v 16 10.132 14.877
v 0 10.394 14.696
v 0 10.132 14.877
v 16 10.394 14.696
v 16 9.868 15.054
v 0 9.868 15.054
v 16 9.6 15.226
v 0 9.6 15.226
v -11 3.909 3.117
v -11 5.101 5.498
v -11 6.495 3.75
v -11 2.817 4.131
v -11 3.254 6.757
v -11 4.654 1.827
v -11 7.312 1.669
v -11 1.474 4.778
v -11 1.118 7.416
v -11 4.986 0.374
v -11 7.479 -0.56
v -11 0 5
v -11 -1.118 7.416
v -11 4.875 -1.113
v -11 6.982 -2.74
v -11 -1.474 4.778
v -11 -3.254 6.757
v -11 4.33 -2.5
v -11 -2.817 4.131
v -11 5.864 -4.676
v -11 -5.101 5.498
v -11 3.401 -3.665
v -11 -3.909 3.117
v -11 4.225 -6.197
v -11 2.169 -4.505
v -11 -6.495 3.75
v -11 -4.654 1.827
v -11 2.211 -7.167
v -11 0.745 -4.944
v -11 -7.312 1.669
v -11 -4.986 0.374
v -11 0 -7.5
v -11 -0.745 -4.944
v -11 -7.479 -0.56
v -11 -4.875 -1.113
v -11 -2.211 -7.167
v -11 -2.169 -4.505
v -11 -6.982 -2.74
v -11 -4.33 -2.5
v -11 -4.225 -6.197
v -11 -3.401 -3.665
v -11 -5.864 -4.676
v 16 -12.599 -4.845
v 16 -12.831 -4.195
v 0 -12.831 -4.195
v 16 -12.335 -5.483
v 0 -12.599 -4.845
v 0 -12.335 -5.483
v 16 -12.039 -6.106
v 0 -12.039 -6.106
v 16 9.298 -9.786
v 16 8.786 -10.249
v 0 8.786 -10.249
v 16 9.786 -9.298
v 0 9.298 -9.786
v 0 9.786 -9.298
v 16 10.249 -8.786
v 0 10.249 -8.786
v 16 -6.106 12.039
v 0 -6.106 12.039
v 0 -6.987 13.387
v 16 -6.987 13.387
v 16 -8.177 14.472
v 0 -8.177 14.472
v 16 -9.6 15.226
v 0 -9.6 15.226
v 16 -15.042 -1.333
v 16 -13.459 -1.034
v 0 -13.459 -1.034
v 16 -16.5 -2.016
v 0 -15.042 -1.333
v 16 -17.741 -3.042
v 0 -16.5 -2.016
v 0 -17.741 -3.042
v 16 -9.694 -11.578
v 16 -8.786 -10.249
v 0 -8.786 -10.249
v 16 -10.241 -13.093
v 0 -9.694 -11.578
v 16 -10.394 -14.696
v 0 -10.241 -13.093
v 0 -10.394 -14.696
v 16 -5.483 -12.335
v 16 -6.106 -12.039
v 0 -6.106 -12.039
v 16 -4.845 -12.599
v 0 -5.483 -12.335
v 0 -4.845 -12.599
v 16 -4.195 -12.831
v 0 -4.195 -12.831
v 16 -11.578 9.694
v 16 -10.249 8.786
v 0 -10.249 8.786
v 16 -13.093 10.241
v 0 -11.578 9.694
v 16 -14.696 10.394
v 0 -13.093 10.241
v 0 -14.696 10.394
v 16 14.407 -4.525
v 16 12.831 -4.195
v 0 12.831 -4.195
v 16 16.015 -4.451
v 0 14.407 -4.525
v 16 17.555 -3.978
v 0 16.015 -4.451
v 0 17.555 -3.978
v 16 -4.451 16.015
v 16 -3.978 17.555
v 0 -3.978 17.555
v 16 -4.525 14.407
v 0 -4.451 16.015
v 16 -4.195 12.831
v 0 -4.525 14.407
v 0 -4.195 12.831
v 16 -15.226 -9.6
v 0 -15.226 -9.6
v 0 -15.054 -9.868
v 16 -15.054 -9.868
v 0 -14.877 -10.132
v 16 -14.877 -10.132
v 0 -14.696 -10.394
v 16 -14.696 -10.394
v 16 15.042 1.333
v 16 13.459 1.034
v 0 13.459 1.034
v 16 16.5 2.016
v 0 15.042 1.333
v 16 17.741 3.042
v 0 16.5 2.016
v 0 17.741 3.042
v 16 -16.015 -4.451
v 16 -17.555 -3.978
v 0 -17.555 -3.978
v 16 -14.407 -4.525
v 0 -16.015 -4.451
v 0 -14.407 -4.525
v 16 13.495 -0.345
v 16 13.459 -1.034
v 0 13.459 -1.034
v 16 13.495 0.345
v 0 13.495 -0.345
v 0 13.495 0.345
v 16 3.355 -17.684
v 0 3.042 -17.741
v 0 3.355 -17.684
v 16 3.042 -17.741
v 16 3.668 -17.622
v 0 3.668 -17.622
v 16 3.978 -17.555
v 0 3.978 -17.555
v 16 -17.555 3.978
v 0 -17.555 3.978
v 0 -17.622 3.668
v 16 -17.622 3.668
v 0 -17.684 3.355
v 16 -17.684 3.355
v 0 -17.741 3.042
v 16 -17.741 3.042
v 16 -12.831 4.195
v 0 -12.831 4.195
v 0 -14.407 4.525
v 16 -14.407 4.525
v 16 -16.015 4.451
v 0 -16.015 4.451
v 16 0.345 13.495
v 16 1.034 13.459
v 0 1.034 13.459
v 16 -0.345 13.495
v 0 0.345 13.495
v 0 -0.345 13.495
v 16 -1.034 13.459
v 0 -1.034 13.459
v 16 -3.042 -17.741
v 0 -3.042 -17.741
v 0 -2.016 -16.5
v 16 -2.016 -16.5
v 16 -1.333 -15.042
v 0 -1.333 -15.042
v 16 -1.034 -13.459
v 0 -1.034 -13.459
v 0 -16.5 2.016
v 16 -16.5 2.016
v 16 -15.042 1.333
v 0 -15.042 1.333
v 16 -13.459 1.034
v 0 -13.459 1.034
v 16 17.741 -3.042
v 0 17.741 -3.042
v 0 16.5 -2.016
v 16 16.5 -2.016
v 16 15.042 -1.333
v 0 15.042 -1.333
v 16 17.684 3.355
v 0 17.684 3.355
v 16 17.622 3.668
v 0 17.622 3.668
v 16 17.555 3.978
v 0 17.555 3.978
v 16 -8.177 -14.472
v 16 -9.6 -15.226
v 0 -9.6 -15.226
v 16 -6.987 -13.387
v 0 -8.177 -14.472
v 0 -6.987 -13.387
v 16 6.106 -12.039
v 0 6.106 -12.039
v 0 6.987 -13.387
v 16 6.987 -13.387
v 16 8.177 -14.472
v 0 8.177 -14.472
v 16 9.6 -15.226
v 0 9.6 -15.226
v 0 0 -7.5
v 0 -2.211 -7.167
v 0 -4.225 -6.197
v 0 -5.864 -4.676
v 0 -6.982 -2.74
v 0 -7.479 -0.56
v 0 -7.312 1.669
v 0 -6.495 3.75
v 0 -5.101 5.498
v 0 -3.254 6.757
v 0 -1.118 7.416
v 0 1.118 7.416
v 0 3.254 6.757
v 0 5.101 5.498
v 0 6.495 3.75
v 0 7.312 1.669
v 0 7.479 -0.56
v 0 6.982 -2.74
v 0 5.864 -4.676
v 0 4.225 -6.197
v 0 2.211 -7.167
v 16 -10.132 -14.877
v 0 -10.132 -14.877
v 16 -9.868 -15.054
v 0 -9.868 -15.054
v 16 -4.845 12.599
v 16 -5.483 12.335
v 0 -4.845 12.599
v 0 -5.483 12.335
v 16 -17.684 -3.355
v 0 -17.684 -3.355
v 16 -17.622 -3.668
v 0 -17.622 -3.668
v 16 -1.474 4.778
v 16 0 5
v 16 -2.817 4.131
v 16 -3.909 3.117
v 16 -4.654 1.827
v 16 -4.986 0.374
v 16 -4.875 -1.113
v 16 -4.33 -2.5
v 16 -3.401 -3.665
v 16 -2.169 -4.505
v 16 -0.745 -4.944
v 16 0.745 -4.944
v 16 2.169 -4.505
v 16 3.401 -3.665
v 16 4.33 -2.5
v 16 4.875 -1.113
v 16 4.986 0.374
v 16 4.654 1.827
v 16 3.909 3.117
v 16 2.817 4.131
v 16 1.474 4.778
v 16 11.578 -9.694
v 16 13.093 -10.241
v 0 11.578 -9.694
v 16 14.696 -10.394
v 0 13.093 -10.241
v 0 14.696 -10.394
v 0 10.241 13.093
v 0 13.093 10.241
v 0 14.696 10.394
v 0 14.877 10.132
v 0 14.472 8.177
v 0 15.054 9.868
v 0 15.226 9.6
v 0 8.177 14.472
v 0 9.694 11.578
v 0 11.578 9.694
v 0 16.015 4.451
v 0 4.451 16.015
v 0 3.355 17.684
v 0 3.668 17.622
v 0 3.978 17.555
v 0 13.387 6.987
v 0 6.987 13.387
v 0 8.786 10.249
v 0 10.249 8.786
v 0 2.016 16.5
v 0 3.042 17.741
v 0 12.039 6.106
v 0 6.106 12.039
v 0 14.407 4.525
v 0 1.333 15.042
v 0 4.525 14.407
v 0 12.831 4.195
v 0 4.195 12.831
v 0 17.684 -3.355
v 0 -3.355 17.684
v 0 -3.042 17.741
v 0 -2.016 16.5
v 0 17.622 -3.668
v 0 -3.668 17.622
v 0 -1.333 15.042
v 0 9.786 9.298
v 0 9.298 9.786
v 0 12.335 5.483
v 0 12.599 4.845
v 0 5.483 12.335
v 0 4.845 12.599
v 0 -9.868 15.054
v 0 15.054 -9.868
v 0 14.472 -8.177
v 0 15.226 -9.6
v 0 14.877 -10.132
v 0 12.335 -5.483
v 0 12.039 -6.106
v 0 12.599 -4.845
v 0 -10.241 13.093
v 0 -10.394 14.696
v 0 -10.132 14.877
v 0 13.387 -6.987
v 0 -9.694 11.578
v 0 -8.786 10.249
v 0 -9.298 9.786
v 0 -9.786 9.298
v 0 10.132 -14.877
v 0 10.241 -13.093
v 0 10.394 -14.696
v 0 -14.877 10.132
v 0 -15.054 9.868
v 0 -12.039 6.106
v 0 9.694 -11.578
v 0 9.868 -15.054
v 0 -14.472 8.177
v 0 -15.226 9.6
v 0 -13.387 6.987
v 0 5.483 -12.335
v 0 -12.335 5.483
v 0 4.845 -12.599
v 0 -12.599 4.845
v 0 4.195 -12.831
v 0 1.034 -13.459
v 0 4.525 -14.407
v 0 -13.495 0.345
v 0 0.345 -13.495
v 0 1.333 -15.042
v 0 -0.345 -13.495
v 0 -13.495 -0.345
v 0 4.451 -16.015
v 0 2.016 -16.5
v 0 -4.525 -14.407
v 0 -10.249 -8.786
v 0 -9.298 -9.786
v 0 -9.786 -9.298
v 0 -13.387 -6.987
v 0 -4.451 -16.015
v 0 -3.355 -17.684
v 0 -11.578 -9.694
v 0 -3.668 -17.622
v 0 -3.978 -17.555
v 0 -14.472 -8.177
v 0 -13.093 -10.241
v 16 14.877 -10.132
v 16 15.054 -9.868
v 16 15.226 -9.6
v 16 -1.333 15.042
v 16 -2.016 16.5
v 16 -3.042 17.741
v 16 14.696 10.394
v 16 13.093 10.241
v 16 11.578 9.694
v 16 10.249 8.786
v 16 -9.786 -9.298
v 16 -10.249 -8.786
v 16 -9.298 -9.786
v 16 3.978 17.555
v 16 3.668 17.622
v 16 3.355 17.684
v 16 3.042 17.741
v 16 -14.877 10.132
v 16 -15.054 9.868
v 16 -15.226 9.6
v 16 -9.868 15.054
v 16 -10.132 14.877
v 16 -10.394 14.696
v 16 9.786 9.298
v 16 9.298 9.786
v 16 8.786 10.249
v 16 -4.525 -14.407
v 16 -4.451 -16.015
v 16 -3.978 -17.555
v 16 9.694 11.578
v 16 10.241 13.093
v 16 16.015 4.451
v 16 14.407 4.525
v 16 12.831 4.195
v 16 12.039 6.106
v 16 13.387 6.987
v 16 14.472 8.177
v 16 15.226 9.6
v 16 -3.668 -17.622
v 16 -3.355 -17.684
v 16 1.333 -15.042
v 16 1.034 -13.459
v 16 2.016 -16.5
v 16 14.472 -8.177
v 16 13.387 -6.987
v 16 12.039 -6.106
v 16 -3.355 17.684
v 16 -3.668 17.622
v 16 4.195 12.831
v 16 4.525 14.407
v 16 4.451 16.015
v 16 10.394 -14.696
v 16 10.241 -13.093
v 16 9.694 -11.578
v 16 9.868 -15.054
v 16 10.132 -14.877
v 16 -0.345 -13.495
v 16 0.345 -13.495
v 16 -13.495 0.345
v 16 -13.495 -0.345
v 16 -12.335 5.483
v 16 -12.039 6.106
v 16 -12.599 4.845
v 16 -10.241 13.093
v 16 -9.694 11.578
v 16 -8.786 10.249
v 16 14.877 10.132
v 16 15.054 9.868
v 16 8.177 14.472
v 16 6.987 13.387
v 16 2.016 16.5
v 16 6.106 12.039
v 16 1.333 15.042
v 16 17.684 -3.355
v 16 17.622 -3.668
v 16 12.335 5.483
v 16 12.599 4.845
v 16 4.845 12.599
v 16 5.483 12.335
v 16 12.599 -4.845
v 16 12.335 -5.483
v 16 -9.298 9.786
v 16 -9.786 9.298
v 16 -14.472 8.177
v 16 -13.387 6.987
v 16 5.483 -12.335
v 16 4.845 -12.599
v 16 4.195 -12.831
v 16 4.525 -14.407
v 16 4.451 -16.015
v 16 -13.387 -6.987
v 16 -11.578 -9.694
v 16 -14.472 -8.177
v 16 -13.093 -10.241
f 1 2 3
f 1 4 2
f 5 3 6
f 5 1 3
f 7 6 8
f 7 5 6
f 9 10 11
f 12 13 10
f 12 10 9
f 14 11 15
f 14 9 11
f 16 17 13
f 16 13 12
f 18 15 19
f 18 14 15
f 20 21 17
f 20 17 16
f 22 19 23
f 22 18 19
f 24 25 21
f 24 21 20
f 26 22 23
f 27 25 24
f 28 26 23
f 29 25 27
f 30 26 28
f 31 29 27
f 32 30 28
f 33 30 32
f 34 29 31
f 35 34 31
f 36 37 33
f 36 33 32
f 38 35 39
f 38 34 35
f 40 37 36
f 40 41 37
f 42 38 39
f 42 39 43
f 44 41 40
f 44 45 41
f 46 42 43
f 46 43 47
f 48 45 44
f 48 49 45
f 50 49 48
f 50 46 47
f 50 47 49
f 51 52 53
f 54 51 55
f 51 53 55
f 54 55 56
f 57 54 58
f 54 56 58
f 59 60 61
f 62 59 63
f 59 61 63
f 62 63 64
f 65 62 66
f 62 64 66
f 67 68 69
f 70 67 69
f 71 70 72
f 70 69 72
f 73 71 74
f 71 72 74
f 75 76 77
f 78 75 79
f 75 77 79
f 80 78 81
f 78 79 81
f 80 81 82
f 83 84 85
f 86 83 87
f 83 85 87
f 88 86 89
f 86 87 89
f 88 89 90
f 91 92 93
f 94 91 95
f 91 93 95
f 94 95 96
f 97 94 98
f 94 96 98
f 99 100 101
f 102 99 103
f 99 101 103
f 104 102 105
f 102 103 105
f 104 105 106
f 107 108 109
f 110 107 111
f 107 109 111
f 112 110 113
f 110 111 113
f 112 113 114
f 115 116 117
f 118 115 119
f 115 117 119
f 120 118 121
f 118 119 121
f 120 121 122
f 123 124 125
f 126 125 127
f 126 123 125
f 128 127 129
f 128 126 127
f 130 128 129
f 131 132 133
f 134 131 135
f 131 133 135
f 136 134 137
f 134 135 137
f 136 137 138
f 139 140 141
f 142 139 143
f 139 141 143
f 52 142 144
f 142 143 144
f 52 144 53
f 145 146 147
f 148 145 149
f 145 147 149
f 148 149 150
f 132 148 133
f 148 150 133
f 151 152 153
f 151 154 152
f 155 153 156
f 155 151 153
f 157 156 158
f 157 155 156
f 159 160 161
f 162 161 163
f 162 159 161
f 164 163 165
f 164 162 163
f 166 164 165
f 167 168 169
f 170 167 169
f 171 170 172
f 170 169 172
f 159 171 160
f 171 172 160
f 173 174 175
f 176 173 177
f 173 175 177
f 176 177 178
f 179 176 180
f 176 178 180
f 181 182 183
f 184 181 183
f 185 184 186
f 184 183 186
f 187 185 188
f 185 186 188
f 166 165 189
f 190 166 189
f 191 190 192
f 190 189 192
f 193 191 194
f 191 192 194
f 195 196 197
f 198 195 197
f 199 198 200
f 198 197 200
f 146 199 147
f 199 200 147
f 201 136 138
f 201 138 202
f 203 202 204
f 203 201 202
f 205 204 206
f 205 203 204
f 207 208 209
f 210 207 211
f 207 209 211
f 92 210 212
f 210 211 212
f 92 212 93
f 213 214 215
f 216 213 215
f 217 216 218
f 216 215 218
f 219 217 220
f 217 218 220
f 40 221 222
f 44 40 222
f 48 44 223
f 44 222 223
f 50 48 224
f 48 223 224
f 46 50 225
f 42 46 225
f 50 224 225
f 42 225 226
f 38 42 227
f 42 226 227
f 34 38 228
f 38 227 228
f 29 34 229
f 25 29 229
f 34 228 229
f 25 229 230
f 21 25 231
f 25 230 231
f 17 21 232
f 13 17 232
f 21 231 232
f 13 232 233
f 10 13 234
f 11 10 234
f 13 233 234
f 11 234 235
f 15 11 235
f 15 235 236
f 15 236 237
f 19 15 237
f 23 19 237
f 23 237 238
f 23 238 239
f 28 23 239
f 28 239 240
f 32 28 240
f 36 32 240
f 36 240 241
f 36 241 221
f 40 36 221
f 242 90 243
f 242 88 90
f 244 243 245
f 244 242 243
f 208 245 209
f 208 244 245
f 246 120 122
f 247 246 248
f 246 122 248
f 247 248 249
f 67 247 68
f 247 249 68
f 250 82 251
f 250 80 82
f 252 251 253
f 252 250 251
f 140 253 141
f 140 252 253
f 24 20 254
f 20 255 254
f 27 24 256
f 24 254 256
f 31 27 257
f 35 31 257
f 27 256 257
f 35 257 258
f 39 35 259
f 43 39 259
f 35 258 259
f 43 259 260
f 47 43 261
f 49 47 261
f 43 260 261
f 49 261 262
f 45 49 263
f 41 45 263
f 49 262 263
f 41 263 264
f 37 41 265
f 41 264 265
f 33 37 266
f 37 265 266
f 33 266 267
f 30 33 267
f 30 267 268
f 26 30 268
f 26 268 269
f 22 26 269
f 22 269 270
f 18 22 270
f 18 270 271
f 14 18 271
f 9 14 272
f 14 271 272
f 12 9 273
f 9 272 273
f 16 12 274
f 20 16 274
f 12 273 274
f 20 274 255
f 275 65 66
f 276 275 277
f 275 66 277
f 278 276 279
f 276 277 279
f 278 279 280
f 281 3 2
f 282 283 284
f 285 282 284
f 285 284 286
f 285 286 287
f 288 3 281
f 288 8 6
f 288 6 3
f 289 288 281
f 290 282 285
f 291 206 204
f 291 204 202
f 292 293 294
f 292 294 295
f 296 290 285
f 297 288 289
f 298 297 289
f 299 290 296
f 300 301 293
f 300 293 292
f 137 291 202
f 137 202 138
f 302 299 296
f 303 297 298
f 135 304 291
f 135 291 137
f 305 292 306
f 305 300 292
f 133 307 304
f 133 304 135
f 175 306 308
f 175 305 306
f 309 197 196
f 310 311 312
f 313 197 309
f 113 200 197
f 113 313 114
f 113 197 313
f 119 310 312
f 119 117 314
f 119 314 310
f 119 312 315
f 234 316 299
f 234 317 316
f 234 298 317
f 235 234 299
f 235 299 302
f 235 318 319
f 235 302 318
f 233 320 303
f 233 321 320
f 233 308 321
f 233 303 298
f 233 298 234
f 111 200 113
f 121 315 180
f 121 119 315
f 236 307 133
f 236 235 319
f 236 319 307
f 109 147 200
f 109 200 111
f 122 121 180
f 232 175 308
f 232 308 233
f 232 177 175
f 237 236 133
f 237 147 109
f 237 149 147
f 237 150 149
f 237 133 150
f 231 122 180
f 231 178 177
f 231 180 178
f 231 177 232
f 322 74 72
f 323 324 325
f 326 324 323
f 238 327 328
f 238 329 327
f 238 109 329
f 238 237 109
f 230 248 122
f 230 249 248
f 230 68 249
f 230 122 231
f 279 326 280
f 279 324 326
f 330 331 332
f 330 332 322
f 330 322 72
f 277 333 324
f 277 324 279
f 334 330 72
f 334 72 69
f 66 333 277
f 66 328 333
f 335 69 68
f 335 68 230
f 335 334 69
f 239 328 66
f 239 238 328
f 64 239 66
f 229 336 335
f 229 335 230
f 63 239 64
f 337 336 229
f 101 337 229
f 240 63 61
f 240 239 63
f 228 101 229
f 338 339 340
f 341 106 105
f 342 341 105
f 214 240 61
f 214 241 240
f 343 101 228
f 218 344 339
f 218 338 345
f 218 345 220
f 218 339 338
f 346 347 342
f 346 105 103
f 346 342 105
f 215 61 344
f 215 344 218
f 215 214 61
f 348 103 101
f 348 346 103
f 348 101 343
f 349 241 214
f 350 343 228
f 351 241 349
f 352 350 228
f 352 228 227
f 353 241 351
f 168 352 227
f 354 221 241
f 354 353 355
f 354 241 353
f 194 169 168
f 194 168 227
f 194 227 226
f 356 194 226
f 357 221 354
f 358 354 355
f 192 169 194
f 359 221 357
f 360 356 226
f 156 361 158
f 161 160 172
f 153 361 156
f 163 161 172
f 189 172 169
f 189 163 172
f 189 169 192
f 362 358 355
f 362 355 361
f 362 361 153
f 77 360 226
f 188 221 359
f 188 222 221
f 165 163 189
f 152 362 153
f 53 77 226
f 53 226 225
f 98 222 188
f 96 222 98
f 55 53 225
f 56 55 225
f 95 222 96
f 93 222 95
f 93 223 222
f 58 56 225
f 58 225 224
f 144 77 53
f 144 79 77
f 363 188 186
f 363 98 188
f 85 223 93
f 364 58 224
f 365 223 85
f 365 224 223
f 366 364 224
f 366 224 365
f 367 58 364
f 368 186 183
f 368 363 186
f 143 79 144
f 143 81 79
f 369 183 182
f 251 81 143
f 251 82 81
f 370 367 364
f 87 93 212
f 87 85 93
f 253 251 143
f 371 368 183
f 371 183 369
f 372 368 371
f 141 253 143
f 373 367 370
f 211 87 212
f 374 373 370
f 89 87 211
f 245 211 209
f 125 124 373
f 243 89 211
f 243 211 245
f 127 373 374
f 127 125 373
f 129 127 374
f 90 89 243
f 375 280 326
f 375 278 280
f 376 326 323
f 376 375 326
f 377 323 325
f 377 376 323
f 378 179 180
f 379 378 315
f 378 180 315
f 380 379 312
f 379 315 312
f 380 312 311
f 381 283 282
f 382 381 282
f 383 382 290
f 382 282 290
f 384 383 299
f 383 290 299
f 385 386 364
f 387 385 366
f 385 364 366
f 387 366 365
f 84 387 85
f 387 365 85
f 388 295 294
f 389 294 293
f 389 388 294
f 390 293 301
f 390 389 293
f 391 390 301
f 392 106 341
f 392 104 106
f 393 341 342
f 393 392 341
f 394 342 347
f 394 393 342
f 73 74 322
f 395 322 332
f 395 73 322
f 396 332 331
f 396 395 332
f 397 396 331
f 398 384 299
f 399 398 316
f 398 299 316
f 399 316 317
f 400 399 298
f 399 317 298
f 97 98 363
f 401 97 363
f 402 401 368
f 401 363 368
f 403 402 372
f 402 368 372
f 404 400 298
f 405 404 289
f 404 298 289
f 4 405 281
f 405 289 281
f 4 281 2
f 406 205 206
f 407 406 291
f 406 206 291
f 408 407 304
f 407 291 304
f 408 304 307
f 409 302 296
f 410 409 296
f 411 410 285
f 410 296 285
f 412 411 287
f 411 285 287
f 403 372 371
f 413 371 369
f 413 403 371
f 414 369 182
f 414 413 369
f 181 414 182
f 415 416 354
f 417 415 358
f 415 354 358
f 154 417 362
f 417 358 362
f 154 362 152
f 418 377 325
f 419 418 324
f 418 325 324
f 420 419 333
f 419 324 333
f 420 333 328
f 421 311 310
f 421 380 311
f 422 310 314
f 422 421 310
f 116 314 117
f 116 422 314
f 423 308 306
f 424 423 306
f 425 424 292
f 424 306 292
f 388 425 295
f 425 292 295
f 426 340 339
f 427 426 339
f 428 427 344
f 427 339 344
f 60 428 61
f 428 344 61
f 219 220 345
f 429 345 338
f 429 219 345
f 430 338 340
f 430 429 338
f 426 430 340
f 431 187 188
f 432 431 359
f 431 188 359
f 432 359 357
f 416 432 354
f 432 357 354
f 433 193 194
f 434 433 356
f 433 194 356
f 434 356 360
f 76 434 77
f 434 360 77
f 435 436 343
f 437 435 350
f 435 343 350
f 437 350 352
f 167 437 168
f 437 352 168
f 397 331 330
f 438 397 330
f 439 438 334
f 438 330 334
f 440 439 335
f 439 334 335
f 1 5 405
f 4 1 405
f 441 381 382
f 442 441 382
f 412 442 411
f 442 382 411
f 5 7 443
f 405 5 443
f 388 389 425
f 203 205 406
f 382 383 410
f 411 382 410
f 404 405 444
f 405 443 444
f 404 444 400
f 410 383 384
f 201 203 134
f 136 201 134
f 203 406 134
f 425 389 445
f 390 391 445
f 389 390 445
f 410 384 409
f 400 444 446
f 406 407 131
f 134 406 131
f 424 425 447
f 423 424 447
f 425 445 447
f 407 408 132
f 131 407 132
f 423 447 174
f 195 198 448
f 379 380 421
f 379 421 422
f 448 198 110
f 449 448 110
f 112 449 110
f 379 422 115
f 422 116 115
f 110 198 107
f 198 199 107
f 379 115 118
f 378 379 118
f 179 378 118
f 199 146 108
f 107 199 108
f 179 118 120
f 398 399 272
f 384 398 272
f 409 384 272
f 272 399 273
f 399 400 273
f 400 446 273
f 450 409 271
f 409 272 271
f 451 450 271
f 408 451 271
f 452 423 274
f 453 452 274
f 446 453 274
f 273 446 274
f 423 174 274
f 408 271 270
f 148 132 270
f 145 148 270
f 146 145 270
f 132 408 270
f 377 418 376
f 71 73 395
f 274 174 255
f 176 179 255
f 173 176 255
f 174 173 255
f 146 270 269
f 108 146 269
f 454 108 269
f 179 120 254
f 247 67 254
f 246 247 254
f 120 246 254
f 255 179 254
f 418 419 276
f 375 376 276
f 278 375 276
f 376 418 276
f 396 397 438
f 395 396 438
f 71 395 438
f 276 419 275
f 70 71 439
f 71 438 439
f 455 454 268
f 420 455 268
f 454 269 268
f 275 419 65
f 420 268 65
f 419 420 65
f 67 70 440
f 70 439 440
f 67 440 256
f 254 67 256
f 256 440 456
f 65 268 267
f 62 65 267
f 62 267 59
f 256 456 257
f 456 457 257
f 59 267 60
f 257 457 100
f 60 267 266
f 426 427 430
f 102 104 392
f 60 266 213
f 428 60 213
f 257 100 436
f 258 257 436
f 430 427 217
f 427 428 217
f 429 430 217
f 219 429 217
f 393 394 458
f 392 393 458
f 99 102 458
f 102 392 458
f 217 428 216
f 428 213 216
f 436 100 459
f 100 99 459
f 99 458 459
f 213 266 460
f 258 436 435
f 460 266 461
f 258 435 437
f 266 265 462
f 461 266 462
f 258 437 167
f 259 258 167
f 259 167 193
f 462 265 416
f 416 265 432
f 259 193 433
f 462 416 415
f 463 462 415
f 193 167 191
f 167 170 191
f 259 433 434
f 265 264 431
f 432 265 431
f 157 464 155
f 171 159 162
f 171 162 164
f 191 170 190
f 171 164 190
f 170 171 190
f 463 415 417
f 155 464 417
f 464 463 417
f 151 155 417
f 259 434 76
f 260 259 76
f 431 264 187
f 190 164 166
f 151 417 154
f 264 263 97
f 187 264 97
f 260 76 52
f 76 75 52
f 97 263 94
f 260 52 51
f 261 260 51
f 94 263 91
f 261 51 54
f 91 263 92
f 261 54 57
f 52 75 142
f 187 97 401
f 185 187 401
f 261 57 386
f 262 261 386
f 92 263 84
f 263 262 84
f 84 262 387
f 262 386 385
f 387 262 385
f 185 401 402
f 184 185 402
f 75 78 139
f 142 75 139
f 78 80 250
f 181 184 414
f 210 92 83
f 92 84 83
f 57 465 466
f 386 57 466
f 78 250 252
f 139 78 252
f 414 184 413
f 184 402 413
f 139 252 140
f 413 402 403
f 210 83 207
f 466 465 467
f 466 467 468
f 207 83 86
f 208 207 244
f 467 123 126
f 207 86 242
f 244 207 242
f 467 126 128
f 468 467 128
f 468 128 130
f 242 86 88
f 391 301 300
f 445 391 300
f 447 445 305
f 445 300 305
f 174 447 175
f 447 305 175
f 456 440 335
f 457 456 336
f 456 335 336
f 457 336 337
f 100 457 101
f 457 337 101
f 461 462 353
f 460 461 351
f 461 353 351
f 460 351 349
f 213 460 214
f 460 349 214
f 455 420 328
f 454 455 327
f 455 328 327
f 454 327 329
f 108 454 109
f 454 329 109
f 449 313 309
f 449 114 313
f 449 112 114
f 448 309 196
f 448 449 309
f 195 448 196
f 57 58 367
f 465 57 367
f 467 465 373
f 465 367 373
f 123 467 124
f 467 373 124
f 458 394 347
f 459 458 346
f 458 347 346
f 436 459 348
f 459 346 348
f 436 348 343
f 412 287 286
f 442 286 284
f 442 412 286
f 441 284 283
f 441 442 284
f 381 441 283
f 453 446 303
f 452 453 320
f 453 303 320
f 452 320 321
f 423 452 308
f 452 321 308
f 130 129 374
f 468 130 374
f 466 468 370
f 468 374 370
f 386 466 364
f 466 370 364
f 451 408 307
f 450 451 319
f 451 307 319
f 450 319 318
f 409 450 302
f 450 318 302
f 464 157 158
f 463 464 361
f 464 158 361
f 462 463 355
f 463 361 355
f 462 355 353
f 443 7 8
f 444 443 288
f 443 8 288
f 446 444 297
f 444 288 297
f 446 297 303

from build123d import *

# Parameters (mm, degrees)
BASPROSKE_W        = 16
BASPROSKE_H        = 18
TOOTHCUT_DEPTH     = 31.066592757
TEETHCUTS_COUNT    = 16
TEETHCUTS_ANGLE    = 337.5
HUBNEAONESKE_R     = 7.5
HUBNEARONE_DEPTH   = 22.0000508
BORSKE_R           = 5
BORE_DEPTH         = 38.0000508
CUT_EXTRUDE1_START = -11
SKETCH1_R          = 7.5
CUT_EXTRUDE1_DEPTH = 11


with BuildPart() as part:
    # BasProSke → Base-Revolve (revolve)
    with BuildSketch(Plane(origin=(0, 0, 0), x_dir=(1, 0, 0), z_dir=(0, 1, 0)), mode=Mode.PRIVATE) as base_revolve_sk:
        with Locations((8, 9)):
            Rectangle(BASPROSKE_W, BASPROSKE_H)
    revolve(base_revolve_sk.sketch.rotate(Axis((-10, 0, 0), (1, 0, 0)), 180), axis=Axis((-10, 0, 0), (1, 0, 0)))

    # TooCutSke → ToothCut (cut, through all)
    with BuildSketch(Plane(origin=(0, 0, 0), x_dir=(0, 0, -1), z_dir=(1, 0, 0))):
        with BuildLine():
            ThreePointArc((1.03434411, 13.459313997), (0, 13.499), (-1.03434411, 13.459313997))
            ThreePointArc((-1.03434411, 13.459313997), (-1.635143665, 15.806872195), (-3.065655864, 17.762792553))
            ThreePointArc((-3.065655864, 17.762792553), (0, 18.0254), (3.065655864, 17.762792553))
            ThreePointArc((3.065655864, 17.762792553), (1.635143665, 15.806872195), (1.03434411, 13.459313997))
        make_face()
    toothcut = extrude(amount=TOOTHCUT_DEPTH, mode=Mode.SUBTRACT)

    # TeethCuts: ToothCut ×16 about axis
    teethcuts_axis = Axis((-10, 0, 0), (1, 0, 0))
    for i in range(1, TEETHCUTS_COUNT):
        add(toothcut.rotate(teethcuts_axis, i * TEETHCUTS_ANGLE / (TEETHCUTS_COUNT - 1)), mode=Mode.SUBTRACT)

    # HubNeaOneSke → HubNearOne (add)
    with BuildSketch(Plane.ZY):
        with Locations(Location((0, 0, 0), (0, 0, 180))):
            Circle(HUBNEAONESKE_R)
    extrude(amount=HUBNEARONE_DEPTH)

    # BorSke → Bore (cut, symmetric)
    with BuildSketch(Plane(origin=(0, 0, 0), x_dir=(0, 0, -1), z_dir=(1, 0, 0))):
        with Locations(Location((0, 0, 0), (0, 0, 180))):
            Circle(BORSKE_R)
    extrude(amount=BORE_DEPTH, both=True, mode=Mode.SUBTRACT)

    # Sketch1 → Cut-Extrude1 (cut)
    with BuildSketch(Plane.ZY.offset(22.0000508).offset(CUT_EXTRUDE1_START)):
        with Locations(Location((0, 0, 0), (0, 0, 180))):
            Circle(SKETCH1_R)
    extrude(amount=CUT_EXTRUDE1_DEPTH, mode=Mode.SUBTRACT)


solid = part.part
